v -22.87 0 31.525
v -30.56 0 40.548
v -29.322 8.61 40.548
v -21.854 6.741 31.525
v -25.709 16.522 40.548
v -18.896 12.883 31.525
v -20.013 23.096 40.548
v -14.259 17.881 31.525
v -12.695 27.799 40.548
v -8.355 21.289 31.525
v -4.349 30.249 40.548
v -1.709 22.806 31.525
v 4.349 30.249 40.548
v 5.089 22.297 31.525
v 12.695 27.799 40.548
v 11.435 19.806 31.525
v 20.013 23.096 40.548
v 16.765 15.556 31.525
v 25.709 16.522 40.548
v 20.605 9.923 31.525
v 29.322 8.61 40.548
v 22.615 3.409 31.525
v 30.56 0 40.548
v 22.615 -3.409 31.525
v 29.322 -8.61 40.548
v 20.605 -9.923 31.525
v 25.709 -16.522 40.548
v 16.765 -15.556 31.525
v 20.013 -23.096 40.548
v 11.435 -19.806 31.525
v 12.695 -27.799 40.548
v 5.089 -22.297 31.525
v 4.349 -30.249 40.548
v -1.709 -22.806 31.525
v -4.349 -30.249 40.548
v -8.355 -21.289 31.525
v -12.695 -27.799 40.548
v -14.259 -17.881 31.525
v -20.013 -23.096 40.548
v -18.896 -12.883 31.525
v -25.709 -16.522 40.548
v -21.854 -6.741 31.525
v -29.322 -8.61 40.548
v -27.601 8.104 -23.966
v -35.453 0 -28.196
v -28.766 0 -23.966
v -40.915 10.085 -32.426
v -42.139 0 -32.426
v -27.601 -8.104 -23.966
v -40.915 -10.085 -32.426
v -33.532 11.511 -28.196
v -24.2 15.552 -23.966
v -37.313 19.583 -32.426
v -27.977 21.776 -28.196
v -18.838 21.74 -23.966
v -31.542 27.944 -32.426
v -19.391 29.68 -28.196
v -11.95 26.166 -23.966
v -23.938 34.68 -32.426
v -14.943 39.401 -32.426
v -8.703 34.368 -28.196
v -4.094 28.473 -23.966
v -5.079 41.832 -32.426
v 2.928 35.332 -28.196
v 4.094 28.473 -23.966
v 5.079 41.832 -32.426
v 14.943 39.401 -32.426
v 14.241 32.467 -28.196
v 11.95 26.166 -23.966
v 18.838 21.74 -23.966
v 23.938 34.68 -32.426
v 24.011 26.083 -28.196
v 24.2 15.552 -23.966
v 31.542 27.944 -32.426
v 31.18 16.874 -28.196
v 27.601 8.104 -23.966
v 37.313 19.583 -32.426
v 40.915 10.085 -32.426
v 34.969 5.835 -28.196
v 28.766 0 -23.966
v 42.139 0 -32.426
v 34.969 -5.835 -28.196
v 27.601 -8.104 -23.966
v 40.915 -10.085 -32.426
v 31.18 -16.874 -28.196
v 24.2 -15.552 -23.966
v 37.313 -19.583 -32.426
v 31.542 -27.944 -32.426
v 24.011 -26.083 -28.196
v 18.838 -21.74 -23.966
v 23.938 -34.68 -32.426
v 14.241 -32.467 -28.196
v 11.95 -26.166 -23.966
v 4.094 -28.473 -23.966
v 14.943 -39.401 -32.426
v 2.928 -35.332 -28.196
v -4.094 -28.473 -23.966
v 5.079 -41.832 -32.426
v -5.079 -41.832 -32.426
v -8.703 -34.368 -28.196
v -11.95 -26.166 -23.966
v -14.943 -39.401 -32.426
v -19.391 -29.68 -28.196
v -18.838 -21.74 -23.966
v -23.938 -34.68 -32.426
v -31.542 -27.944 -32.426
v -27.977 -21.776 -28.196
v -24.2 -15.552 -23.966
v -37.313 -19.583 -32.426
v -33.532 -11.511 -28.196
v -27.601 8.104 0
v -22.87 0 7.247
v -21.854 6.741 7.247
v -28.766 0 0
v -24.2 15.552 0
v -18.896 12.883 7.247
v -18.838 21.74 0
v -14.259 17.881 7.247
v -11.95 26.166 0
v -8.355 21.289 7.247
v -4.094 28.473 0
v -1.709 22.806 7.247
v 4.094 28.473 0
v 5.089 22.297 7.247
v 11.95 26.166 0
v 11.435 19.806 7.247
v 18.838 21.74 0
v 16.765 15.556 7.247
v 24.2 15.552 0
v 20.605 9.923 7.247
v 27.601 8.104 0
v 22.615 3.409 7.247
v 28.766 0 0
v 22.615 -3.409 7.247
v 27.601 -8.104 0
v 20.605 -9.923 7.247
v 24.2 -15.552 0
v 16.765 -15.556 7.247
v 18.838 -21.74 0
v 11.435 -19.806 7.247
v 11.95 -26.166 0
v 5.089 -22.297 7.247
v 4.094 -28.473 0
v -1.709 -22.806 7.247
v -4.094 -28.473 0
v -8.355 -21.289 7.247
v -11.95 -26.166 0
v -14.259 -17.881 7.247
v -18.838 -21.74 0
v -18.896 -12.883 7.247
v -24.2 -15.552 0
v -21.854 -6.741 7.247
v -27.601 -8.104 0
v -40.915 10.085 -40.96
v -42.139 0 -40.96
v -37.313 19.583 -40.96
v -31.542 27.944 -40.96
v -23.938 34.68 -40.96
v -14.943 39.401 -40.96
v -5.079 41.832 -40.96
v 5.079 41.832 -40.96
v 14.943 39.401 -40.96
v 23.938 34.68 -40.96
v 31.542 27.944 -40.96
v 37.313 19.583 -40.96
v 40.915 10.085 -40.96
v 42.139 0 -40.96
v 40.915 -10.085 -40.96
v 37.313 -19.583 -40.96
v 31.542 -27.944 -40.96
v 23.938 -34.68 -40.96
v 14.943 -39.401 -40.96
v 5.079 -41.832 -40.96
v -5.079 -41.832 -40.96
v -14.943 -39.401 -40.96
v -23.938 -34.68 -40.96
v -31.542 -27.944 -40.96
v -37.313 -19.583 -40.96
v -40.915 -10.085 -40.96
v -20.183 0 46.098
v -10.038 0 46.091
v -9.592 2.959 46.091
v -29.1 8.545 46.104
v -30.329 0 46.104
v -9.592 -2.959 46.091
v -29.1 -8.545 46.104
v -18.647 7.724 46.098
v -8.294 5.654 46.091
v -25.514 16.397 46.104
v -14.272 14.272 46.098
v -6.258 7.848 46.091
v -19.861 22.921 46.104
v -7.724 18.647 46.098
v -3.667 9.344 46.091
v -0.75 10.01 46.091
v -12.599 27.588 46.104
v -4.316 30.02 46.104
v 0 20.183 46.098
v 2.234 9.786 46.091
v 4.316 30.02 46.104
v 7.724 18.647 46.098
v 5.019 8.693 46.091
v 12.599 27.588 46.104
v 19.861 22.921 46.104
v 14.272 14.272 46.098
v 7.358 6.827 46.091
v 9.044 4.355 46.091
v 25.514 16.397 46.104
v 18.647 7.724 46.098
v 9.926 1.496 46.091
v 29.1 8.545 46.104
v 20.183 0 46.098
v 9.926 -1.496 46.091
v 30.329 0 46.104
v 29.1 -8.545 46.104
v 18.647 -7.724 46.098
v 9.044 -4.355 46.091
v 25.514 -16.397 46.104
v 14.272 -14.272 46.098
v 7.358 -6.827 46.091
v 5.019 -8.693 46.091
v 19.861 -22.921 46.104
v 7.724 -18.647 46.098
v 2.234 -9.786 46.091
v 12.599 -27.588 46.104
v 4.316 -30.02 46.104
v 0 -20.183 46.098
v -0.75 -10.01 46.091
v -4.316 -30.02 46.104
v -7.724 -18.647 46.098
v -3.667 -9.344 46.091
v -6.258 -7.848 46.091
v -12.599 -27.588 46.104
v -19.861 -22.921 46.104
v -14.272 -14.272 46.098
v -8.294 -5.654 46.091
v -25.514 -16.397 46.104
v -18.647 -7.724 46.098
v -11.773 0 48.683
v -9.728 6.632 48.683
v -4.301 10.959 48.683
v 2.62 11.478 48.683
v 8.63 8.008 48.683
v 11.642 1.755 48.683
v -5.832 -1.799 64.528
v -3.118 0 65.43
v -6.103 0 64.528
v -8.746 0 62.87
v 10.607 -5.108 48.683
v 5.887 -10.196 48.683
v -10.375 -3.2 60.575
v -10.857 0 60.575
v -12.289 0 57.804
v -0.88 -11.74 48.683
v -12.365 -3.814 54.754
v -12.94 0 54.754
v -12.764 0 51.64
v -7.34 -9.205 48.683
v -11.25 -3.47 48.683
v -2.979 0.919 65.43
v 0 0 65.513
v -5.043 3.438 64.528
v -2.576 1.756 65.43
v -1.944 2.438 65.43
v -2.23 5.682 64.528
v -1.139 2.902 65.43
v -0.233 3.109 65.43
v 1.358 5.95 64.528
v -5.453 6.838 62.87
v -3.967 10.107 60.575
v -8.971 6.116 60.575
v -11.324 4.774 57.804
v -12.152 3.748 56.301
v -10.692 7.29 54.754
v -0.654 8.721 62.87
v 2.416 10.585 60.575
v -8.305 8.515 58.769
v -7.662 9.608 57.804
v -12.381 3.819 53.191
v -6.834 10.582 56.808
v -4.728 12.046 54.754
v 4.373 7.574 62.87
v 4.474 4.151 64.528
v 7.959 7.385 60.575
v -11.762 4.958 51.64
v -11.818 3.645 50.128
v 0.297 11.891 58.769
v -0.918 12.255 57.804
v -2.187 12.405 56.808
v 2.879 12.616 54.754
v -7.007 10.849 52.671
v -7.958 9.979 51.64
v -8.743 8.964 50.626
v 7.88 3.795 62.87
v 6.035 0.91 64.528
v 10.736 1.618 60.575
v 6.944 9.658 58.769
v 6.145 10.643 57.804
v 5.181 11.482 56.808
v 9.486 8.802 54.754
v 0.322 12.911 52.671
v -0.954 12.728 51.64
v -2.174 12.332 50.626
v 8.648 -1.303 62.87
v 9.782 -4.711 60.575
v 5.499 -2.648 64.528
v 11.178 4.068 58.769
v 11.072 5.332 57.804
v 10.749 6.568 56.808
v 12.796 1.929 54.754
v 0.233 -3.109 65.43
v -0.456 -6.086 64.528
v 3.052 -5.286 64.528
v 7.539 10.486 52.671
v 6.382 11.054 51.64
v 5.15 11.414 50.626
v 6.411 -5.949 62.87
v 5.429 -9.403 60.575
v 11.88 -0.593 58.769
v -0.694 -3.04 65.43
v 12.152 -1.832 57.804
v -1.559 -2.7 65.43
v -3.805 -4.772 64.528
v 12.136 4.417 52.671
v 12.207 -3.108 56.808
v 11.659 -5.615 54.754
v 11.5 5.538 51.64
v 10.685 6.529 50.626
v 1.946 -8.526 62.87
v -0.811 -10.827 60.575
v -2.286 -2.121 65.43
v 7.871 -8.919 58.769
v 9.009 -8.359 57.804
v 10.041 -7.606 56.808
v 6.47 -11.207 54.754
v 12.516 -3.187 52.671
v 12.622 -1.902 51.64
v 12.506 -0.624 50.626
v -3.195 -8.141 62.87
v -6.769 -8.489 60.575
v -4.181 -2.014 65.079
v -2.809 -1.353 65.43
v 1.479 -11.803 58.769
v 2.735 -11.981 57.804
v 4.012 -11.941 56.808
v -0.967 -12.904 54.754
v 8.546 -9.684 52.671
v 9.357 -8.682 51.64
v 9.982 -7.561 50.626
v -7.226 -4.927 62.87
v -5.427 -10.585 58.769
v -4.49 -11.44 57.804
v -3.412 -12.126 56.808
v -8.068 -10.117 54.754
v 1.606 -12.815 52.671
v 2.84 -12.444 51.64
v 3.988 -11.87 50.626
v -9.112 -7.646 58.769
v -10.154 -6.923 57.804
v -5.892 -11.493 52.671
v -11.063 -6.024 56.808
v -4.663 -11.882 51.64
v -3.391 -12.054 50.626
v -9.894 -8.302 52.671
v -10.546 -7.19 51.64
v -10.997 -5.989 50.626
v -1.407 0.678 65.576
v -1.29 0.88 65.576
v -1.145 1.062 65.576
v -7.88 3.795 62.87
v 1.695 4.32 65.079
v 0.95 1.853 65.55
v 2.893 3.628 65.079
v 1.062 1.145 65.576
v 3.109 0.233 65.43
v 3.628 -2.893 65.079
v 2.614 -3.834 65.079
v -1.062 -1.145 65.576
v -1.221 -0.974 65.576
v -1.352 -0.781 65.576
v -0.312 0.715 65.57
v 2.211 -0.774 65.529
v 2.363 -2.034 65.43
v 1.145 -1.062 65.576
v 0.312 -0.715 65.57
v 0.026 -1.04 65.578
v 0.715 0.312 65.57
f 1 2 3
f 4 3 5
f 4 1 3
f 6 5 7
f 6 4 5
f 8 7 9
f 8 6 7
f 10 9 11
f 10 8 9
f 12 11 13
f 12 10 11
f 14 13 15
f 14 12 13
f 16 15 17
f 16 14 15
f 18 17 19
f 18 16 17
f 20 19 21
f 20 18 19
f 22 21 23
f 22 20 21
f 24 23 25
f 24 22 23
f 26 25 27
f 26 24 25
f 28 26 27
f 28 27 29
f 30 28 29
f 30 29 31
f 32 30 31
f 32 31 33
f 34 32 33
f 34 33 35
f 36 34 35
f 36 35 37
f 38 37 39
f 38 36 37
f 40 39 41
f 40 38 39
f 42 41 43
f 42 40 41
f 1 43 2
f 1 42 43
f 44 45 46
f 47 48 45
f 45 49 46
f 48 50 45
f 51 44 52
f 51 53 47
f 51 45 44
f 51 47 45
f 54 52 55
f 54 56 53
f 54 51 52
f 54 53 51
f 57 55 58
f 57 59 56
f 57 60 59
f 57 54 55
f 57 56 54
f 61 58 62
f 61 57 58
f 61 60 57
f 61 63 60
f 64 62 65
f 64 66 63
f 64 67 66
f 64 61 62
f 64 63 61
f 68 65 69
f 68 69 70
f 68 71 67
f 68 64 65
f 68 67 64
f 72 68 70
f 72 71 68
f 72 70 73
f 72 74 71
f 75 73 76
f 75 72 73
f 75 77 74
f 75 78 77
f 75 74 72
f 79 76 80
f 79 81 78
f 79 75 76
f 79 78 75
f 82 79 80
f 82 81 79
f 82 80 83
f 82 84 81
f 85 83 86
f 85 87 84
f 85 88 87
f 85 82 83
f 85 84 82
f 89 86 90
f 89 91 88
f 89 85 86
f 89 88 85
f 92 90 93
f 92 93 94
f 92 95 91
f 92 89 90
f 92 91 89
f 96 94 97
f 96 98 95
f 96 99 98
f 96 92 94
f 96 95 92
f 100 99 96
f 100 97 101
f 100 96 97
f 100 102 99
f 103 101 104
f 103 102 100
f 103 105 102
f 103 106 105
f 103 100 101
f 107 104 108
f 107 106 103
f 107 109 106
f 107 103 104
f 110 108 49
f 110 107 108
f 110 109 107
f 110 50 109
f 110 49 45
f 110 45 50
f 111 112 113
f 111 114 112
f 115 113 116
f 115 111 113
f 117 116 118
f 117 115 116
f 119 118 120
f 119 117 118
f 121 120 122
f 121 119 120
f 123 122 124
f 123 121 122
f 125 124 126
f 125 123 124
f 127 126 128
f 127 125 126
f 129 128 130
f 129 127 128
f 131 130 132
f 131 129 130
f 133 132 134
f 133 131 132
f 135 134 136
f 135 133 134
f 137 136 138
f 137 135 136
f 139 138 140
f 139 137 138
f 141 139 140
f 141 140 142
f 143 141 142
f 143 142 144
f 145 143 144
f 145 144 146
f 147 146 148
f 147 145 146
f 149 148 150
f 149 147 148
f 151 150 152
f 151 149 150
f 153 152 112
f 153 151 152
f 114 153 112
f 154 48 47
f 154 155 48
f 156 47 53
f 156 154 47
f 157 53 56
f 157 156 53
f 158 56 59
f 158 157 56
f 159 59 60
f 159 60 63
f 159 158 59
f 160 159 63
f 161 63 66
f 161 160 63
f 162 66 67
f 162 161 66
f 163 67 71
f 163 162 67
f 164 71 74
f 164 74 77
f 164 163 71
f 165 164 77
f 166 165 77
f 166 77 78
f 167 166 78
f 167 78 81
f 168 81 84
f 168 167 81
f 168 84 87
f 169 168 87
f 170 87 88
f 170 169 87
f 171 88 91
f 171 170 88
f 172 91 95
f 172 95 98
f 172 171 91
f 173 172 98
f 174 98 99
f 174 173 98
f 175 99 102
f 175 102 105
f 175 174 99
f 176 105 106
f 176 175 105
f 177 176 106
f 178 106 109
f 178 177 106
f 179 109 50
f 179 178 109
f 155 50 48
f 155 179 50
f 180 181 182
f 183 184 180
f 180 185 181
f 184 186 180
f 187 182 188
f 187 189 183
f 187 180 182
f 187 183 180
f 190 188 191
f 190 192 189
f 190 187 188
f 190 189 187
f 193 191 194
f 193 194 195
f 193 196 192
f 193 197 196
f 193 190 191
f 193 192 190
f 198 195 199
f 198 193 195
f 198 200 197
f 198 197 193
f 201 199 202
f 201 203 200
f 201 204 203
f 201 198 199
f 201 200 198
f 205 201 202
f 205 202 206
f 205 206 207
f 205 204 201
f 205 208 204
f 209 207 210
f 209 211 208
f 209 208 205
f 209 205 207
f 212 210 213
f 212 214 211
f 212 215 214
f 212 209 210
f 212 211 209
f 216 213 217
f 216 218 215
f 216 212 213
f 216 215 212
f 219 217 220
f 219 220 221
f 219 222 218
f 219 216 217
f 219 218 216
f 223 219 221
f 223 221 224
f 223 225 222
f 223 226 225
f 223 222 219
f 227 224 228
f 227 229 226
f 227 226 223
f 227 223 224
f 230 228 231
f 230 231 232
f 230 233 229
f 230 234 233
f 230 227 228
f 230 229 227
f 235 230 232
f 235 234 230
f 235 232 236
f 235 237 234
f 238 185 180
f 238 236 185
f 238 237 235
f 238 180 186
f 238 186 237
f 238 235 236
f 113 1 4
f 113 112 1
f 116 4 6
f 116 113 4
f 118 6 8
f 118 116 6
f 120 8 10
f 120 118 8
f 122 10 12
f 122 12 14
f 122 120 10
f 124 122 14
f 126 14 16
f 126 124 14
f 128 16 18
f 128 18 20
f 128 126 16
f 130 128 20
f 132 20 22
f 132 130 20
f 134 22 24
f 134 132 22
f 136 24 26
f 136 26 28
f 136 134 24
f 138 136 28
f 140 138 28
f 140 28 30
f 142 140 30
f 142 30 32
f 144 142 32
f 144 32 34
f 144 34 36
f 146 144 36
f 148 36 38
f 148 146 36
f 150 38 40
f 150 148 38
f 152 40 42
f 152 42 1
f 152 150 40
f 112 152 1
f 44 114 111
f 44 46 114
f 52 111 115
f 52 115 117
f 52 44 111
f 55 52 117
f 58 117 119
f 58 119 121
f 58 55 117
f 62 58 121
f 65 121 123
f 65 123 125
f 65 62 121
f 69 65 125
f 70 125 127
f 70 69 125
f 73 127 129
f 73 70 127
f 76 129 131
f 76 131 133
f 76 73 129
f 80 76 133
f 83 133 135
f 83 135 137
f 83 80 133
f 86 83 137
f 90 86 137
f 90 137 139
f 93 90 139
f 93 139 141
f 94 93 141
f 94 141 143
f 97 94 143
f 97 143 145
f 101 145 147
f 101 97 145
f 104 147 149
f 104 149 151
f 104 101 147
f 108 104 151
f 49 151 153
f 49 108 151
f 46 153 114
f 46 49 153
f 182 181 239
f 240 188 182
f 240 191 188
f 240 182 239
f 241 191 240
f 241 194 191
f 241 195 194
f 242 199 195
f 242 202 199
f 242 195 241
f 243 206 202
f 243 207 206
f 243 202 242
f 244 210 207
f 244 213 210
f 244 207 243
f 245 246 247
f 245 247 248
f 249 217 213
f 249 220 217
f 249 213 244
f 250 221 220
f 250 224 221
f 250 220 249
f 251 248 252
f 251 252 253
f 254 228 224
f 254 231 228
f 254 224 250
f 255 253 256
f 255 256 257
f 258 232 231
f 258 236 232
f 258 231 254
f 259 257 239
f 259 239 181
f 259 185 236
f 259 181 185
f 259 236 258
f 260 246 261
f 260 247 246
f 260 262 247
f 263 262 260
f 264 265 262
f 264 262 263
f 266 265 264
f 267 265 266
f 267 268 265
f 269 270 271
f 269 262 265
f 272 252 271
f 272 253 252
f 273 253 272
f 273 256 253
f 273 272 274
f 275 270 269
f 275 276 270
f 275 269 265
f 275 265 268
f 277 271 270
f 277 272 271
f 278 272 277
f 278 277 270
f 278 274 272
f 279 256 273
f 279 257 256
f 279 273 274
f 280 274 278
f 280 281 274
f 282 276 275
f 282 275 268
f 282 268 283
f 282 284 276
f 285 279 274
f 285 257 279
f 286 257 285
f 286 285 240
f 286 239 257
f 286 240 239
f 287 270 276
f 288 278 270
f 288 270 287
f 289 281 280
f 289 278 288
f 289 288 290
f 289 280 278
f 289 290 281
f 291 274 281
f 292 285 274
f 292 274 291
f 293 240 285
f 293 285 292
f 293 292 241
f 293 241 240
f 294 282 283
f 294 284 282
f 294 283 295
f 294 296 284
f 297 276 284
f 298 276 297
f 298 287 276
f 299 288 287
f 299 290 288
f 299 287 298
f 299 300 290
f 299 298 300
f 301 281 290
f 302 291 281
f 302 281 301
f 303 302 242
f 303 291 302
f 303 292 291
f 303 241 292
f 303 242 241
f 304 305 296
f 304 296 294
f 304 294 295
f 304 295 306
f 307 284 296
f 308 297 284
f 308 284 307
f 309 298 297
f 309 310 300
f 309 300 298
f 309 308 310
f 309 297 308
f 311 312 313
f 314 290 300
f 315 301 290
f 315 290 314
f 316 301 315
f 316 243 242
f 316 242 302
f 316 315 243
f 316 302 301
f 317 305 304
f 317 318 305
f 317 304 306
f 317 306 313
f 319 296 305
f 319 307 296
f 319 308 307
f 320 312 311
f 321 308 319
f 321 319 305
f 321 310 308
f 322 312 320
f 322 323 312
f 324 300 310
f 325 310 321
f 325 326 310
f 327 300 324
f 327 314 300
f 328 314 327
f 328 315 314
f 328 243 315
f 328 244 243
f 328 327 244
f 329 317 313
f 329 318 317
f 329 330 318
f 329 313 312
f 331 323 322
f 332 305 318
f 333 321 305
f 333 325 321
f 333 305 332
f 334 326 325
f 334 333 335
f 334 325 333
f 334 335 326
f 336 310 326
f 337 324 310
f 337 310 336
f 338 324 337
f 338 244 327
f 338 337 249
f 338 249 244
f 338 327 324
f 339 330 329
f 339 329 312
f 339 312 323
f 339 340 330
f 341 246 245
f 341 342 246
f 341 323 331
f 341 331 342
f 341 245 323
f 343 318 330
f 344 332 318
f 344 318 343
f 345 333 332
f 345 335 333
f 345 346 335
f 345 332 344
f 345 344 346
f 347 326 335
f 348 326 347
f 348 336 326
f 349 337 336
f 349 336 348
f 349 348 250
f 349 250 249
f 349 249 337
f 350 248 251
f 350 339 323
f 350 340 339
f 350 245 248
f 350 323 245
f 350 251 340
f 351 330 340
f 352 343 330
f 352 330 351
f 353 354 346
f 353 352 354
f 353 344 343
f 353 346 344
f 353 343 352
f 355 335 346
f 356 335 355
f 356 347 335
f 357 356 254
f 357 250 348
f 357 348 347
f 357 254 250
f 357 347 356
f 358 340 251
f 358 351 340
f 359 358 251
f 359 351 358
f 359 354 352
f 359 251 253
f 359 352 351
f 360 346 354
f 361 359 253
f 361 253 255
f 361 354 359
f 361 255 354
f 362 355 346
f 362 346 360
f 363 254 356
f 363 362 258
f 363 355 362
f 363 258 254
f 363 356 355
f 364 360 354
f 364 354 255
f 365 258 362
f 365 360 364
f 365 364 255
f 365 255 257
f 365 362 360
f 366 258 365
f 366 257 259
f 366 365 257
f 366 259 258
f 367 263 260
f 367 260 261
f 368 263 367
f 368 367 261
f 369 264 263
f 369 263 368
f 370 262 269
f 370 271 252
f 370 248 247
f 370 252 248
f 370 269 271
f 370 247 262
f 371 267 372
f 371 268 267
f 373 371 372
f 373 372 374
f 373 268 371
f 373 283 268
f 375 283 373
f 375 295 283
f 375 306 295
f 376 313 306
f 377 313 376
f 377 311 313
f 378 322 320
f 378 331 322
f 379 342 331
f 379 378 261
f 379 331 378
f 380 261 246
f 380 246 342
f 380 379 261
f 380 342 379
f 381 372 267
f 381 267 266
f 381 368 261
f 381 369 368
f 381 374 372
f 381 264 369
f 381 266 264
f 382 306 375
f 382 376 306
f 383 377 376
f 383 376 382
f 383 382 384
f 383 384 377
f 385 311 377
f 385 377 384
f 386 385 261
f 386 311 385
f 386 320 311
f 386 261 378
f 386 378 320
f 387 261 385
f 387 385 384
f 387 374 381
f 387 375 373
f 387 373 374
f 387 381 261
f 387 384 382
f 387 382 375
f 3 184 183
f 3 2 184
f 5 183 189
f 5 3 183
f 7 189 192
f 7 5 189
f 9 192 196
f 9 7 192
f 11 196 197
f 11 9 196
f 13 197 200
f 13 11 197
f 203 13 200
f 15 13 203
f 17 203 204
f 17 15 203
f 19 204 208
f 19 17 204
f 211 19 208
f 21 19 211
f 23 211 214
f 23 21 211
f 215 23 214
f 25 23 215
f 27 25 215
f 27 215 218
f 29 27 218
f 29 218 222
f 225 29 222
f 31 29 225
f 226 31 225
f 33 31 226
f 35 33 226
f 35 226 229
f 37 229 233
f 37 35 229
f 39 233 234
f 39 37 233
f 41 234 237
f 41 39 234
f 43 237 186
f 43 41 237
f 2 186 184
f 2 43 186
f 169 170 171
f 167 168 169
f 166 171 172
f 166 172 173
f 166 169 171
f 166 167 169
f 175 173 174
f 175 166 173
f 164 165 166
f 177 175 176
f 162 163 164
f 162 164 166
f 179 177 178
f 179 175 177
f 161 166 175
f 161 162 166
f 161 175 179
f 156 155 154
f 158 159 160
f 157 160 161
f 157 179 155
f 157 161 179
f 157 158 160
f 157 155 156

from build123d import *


# Not quite as in the source:
# - a feature names something its author has since deleted; it is built from what else it names


with BuildPart() as f1:
    # F0 (on Front) → F1 (revolve)
    with BuildSketch(Plane.XZ):
        with BuildLine():
            Line((-28.766008094, 0), (-28.766008094, -23.9662192762))
            Line((-28.766008094, -23.9662192762), (-42.1394705772, -32.4264727533))
            Line((-42.1394705772, -32.4264727533), (-42.1394705772, -40.9603528678))
            Line((-42.1394705772, -40.9603528678), (0, -40.9603528678))
            Line((0, -40.9603528678), (0, 65.5130892992))
            ThreePointArc((0, 65.5130892992), (-11.6659559175, 59.2375527161), (-10.0377807394, 46.0912249982))
            Line((-10.0377807394, 46.0912249982), (-30.3286965936, 46.1038053036))
            Line((-30.3286965936, 46.1038053036), (-30.560169369, 40.5484326184))
            Line((-30.560169369, 40.5484326184), (-22.8700842708, 31.5248221159))
            Line((-22.8700842708, 31.5248221159), (-22.8700842708, 7.2474917397))
            Line((-22.8700842708, 7.2474917397), (-28.766008094, 0))
        make_face()
    revolve(axis=Axis((0, 0, 12.2763682157), (0, 0, -1)))


solid = f1.part
